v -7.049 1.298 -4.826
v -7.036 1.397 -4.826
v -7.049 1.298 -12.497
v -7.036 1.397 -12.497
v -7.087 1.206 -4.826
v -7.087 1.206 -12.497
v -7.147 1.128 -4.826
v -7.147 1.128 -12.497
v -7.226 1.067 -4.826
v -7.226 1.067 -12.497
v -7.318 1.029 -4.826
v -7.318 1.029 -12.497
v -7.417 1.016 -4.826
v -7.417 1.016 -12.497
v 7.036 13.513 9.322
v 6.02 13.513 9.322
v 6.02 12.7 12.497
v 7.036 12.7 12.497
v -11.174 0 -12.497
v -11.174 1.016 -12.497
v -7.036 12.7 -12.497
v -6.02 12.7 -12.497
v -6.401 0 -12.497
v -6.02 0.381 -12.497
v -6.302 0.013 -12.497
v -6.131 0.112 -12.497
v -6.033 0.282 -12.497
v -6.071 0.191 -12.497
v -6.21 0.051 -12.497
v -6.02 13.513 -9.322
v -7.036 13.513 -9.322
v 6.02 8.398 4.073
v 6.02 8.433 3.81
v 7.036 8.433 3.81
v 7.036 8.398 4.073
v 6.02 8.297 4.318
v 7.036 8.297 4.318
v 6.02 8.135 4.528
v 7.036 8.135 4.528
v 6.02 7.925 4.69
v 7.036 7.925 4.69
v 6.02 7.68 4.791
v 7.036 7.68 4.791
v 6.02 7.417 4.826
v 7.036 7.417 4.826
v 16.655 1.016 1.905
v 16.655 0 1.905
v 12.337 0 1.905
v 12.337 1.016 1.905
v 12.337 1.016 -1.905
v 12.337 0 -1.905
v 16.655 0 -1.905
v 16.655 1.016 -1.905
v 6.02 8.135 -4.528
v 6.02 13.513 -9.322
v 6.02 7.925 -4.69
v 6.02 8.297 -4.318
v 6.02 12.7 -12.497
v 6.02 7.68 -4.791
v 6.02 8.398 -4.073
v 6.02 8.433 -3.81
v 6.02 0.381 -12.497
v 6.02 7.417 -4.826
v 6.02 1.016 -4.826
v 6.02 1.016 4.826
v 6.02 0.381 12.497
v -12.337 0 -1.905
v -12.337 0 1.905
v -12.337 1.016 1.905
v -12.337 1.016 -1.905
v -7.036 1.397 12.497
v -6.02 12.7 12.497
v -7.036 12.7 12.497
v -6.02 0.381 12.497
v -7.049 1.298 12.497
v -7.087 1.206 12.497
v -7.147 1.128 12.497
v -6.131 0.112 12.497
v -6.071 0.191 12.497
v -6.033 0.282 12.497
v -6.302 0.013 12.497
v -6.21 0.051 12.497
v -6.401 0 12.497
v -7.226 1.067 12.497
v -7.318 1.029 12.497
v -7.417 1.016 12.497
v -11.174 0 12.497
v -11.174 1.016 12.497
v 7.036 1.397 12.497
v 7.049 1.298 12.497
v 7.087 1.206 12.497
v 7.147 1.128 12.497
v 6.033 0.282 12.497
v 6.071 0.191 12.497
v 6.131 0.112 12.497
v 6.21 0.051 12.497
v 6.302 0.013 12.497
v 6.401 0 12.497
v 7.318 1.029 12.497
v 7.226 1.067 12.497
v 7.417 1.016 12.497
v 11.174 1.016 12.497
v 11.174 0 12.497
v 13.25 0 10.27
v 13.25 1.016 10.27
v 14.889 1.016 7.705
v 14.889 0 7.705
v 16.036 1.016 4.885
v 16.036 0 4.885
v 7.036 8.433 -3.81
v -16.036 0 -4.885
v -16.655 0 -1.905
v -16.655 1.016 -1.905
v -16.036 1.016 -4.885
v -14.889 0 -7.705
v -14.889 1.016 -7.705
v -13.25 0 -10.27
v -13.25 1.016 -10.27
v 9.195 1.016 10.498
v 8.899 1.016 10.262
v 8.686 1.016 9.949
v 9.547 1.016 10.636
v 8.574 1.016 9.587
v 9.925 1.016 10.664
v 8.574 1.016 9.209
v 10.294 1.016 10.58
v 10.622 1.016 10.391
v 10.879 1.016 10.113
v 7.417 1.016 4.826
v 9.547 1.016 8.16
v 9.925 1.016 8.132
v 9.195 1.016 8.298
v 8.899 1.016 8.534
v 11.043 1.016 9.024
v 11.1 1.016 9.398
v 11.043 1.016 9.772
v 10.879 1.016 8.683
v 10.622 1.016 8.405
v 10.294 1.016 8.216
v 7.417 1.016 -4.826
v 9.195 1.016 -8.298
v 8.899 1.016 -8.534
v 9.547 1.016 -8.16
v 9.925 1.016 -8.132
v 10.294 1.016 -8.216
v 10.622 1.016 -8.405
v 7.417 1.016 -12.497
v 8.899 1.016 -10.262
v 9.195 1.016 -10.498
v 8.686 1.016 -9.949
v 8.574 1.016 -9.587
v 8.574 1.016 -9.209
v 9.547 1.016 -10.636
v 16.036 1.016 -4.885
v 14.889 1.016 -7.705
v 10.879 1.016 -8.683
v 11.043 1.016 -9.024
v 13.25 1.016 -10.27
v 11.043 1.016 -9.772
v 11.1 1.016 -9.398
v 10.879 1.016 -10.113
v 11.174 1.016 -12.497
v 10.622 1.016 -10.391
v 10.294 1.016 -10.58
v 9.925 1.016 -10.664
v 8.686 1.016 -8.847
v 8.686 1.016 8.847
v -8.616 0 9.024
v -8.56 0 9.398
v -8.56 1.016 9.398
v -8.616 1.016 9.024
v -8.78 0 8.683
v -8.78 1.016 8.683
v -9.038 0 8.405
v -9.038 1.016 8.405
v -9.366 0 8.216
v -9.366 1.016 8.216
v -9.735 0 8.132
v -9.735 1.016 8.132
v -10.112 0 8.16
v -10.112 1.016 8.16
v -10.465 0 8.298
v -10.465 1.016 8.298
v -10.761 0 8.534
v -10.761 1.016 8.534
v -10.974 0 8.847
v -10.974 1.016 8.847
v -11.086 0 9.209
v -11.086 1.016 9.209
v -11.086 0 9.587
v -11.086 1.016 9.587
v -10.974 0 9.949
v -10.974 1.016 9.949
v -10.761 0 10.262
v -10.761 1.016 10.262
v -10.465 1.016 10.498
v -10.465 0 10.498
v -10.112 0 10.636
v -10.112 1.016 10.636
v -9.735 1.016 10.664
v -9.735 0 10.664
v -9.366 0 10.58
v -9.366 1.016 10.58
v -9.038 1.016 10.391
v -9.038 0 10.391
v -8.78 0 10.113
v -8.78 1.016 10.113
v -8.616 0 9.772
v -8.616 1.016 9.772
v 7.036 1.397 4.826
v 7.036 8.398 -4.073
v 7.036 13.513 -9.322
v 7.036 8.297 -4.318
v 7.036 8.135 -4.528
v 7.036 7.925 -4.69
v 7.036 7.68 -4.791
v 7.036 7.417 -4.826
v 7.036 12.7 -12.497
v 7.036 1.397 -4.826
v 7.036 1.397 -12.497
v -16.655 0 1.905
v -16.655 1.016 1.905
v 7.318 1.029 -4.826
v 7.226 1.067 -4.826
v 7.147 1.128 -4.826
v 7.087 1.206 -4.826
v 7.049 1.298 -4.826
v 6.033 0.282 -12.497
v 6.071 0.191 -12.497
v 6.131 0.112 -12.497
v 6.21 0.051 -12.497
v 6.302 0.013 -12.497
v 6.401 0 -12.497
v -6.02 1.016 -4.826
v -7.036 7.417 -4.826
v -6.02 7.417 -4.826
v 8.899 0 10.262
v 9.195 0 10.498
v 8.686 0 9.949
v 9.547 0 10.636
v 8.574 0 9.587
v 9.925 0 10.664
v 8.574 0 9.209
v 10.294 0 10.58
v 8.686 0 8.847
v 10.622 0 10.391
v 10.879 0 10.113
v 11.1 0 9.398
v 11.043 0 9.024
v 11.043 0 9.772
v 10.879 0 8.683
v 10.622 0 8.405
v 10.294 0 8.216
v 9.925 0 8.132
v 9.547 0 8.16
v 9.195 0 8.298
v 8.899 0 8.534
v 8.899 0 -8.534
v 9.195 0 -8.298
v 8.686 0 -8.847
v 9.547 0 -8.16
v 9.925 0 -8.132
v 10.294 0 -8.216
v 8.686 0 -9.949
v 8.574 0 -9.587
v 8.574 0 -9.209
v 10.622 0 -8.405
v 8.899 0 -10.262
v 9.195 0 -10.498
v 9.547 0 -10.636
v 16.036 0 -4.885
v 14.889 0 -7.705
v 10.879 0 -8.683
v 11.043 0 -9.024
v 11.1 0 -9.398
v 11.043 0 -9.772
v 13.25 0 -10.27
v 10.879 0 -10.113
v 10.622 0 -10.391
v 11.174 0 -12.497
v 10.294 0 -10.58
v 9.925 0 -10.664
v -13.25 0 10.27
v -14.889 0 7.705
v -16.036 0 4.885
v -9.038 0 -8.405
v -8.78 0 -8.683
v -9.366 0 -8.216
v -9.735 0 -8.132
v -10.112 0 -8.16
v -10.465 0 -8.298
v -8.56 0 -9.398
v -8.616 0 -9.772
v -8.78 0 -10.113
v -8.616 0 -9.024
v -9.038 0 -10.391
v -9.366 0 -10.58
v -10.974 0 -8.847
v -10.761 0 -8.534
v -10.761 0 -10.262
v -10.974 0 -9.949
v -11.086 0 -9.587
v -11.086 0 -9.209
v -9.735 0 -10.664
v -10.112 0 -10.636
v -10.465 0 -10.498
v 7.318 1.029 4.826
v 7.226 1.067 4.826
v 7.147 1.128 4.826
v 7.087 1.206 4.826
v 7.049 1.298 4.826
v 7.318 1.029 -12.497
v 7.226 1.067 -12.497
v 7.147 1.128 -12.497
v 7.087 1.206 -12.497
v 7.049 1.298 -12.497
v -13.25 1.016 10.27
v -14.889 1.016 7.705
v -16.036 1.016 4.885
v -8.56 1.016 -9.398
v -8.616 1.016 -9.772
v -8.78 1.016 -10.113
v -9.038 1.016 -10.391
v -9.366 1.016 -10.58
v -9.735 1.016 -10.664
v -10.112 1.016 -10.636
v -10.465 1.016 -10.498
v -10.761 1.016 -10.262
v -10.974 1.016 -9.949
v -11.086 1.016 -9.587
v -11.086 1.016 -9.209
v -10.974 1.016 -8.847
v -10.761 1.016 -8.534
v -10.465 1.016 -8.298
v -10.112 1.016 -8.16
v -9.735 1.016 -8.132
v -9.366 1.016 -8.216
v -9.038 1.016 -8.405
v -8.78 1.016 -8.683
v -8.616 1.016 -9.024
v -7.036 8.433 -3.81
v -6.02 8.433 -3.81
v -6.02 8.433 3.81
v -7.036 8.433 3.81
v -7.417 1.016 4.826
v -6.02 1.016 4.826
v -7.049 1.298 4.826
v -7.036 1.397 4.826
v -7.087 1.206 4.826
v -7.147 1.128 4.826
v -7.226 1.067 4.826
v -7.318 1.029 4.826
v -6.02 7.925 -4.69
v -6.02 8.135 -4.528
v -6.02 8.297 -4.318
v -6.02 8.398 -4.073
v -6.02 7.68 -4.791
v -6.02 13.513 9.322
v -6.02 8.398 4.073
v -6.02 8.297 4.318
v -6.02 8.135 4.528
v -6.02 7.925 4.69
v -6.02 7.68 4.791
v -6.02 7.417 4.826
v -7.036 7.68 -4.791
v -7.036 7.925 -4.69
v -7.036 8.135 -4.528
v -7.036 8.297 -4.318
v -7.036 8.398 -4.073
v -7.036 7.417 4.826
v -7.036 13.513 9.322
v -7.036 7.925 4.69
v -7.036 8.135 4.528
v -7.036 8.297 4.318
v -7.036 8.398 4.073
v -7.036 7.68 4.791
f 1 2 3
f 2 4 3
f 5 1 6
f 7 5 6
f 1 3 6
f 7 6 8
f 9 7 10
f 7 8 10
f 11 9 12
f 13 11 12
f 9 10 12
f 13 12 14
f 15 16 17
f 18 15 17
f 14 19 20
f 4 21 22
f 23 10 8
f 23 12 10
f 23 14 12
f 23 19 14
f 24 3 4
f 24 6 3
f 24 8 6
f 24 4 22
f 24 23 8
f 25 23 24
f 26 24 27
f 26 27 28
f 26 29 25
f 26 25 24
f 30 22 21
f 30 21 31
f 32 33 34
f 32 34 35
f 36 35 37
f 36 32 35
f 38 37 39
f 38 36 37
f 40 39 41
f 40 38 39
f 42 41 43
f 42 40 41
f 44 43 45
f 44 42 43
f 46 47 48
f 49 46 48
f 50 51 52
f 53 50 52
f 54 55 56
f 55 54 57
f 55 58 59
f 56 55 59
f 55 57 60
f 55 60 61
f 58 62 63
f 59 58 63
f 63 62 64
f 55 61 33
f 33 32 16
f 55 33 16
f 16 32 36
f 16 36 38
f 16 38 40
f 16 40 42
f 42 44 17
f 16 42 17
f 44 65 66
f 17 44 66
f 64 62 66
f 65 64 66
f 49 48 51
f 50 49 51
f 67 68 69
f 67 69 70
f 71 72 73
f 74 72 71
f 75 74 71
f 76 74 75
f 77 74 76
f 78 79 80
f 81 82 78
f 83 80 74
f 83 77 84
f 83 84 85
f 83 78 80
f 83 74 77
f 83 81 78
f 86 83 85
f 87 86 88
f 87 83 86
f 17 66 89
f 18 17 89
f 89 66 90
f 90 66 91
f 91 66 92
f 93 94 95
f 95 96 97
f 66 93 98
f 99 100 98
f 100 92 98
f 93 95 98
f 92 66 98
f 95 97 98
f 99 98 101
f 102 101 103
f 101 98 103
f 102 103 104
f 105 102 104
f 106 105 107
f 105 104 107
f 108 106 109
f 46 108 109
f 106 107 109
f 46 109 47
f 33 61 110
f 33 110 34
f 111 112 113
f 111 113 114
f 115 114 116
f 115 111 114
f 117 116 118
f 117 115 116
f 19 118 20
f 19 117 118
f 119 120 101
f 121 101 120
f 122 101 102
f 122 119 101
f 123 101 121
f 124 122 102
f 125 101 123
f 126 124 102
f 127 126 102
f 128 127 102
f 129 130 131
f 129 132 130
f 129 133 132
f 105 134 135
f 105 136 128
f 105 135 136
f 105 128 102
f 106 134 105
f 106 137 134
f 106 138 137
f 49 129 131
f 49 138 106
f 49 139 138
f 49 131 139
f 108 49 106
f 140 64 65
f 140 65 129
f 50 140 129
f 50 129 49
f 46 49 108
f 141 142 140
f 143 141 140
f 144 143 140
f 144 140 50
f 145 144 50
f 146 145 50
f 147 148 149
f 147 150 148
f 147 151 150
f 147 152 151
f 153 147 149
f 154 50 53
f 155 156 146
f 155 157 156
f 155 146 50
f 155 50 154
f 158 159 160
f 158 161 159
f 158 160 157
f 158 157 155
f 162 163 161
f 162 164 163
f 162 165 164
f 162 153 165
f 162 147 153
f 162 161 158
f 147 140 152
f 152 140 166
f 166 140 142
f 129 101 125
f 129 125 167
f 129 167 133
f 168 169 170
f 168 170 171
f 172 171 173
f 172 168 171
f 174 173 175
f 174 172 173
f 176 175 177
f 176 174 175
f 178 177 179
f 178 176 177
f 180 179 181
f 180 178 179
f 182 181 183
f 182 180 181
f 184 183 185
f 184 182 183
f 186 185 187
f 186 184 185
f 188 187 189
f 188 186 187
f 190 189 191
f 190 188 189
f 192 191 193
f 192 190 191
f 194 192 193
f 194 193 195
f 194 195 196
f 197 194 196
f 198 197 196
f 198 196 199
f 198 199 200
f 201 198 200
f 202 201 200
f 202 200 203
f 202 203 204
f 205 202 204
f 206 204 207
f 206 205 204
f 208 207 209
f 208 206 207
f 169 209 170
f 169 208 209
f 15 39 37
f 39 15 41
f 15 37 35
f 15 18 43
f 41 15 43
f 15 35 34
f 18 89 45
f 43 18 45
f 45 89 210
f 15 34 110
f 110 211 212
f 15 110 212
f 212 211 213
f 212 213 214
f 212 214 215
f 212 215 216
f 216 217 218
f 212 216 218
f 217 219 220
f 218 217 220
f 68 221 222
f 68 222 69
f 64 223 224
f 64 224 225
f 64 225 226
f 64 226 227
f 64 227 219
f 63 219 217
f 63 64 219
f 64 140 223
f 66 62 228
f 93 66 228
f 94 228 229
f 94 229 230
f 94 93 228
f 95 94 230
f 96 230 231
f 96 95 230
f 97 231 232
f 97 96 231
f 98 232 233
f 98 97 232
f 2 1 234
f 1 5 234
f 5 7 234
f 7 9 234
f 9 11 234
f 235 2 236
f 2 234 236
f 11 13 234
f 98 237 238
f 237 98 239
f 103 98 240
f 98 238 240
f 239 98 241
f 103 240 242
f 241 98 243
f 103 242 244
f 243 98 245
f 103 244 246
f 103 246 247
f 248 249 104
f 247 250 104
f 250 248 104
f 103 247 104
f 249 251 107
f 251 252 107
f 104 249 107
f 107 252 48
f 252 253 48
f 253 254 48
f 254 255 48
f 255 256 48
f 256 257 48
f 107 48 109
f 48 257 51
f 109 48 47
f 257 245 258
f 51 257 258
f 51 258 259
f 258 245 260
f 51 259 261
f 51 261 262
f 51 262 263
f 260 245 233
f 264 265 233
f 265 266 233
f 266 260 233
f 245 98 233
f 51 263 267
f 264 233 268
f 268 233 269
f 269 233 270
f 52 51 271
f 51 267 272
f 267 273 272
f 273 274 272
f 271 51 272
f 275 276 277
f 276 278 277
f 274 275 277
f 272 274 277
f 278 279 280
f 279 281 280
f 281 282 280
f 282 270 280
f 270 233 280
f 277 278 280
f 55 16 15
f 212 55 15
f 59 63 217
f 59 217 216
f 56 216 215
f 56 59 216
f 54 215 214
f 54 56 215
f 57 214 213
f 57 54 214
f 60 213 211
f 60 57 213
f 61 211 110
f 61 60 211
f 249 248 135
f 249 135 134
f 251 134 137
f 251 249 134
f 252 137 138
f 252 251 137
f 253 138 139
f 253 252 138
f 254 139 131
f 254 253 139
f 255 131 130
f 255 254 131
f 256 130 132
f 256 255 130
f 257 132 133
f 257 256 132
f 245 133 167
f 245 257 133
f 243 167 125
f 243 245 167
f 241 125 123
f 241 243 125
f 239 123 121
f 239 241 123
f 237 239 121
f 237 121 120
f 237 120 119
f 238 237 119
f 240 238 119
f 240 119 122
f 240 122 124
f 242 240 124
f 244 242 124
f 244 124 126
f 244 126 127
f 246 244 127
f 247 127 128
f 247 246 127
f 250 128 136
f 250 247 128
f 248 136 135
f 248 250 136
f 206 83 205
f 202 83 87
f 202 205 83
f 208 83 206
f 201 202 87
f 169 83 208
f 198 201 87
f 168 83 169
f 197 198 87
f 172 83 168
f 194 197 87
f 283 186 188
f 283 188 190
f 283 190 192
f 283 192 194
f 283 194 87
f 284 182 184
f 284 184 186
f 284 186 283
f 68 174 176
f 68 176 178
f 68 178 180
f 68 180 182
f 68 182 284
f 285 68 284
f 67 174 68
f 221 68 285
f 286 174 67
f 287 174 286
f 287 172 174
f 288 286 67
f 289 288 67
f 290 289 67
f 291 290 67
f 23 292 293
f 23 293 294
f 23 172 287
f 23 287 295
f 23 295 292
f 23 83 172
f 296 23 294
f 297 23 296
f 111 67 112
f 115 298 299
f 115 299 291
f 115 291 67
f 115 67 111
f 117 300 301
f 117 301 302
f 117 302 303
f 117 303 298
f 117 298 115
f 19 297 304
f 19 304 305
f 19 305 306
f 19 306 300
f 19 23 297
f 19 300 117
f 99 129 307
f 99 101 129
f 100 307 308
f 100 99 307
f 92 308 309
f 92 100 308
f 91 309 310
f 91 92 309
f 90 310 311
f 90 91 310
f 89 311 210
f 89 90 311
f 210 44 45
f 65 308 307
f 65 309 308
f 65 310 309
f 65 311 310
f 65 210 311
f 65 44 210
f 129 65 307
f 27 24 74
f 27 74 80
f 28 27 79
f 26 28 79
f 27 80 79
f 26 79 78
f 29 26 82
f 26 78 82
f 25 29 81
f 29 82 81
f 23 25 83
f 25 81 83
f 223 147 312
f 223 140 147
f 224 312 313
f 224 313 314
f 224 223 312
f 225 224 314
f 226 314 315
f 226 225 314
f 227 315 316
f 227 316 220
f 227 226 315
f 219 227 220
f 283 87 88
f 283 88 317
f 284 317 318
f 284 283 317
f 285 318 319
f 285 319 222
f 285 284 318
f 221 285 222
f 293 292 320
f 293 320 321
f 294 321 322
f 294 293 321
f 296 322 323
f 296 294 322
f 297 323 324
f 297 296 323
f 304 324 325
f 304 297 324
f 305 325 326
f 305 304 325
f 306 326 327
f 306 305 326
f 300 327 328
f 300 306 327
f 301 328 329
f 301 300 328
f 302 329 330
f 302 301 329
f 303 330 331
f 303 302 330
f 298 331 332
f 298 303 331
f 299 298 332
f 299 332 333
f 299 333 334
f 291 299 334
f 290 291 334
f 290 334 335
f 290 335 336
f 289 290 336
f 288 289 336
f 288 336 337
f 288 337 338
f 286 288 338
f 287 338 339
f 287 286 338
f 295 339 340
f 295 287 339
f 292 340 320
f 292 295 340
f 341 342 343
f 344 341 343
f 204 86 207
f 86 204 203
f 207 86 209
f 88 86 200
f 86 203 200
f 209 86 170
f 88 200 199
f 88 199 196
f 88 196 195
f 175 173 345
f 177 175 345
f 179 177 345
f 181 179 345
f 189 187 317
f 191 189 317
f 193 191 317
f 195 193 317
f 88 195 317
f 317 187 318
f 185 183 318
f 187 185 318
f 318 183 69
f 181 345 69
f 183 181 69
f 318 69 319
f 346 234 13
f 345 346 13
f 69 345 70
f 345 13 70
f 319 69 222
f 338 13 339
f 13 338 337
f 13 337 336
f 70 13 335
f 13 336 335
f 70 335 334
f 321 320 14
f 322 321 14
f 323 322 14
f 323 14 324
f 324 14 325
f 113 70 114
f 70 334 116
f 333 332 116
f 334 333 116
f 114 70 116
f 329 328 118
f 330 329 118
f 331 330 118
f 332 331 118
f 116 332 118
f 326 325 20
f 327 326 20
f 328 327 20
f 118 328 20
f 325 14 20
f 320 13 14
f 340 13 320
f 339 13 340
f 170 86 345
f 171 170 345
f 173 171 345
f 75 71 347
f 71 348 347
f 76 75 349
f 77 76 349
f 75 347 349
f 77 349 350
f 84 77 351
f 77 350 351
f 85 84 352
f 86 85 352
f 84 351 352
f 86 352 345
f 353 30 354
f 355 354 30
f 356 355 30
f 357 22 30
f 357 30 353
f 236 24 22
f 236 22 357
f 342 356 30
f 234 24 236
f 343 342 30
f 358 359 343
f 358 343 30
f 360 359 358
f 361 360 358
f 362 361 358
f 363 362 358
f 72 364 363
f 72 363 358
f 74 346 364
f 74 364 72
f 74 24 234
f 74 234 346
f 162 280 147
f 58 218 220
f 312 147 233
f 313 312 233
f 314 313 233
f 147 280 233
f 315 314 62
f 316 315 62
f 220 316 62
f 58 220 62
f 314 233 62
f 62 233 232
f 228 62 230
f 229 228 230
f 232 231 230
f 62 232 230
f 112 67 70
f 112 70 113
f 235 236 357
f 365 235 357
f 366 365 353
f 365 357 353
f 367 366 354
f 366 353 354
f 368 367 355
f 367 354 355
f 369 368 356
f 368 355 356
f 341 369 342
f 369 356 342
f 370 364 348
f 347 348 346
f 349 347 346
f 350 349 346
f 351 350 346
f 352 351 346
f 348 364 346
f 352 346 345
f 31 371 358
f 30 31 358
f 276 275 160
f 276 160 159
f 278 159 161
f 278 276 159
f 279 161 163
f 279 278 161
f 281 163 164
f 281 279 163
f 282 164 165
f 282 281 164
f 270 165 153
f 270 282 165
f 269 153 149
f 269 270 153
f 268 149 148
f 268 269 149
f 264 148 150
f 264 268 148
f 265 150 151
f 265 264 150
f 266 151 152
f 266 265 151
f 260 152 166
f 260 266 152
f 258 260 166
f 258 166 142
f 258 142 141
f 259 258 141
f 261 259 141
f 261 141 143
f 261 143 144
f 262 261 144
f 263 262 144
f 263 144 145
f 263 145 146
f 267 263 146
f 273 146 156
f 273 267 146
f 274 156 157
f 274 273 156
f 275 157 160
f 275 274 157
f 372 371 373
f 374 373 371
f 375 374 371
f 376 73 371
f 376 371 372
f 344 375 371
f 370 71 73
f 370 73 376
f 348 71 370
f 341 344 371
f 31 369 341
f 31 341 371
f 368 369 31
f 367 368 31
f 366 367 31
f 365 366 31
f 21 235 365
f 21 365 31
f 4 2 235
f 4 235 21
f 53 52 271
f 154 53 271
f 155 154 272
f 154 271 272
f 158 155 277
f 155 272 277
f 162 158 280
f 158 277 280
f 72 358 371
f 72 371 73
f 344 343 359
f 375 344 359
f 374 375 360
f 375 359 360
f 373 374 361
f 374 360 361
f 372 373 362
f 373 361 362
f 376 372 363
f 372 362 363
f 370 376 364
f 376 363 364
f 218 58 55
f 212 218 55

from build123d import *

# Parameters (mm, degrees)
SKETCH1_R               = 1.27
BOSS_EXTRUDE1_DEPTH     = 1.016
BOSS_EXTRUDE1_2_DEPTH   = 1.016
SKETCH2_W               = 1.016
SKETCH2_H               = 24.9936
BOSS_EXTRUDE2_DEPTH     = 13.5128
CUT_EXTRUDE1_DEPTH      = 13.5128
CUT_EXTRUDE1_DEPTH_BACK = 13.5128
FILLET1_R               = 0.381
FILLET2_R               = 0.381


with BuildPart() as part:
    # Sketch1 → Boss-Extrude1 (new body)
    with BuildSketch(Plane(origin=(0, 0, 0), x_dir=(1, 0, 0), z_dir=(0, 1, 0))):
        with BuildLine():
            Line((11.174152575, 12.4968), (6.0198, 12.4968))
            Line((6.0198, 12.4968), (6.0198, -12.4968))
            Line((6.0198, -12.4968), (11.174152575, -12.4968))
            ThreePointArc((11.174152575, -12.4968), (14.888508669, -7.704804061), (16.655409662, -1.905))
            Line((16.655409662, -1.905), (12.337409662, -1.905))
            Line((12.337409662, -1.905), (12.337409662, 1.905))
            Line((12.337409662, 1.905), (16.655409662, 1.905))
            ThreePointArc((16.655409662, 1.905), (14.888508669, 7.704804061), (11.174152575, 12.4968))
        make_face()
        with Locations((9.8298, -9.398)):
            Circle(SKETCH1_R, mode=Mode.SUBTRACT)
        with Locations((9.8298, 9.398)):
            Circle(SKETCH1_R, mode=Mode.SUBTRACT)
    extrude(amount=BOSS_EXTRUDE1_DEPTH)



with BuildPart() as body_2:
    # Sketch1 → Boss-Extrude1 2 (new body)
    with BuildSketch(Plane(origin=(0, 0, 0), x_dir=(1, 0, 0), z_dir=(0, 1, 0))):
        with BuildLine():
            Line((-6.0198, -12.4968), (-11.174152575, -12.4968))
            ThreePointArc((-11.174152575, -12.4968), (-14.888508669, -7.704804061), (-16.655409662, -1.905))
            Line((-16.655409662, -1.905), (-12.337409662, -1.905))
            Line((-12.337409662, -1.905), (-12.337409662, 1.905))
            Line((-12.337409662, 1.905), (-16.655409662, 1.905))
            ThreePointArc((-16.655409662, 1.905), (-14.888508669, 7.704804061), (-11.174152575, 12.4968))
            Line((-11.174152575, 12.4968), (-6.0198, 12.4968))
            Line((-6.0198, 12.4968), (-6.0198, -12.4968))
        make_face()
        with Locations((-9.8298, 9.398)):
            Circle(SKETCH1_R, mode=Mode.SUBTRACT)
        with Locations((-9.8298, -9.398)):
            Circle(SKETCH1_R, mode=Mode.SUBTRACT)
    extrude(amount=BOSS_EXTRUDE1_2_DEPTH)


with BuildPart() as part_1:
    add(part.part)

    add(body_2.part)  # Boss-Extrude2 merges body 2
    # Sketch2 → Boss-Extrude2 (add)
    with BuildSketch(Plane(origin=(0, 0, 0), x_dir=(1, 0, 0), z_dir=(0, 1, 0))):
        with Locations((-6.5278, 0)):
            Rectangle(SKETCH2_W, SKETCH2_H)
        with Locations((6.5278, 0)):
            Rectangle(SKETCH2_W, SKETCH2_H)
    extrude(amount=BOSS_EXTRUDE2_DEPTH)

    # Sketch3 → Cut-Extrude1 (cut, two sides)
    with BuildSketch(Plane(origin=(0, 0, 0), x_dir=(0, 0, -1), z_dir=(1, 0, 0))) as cut_extrude1_sk:
        Polygon((-12.4968, 13.5128), (-9.3218, 13.5128), (-12.4968, 12.7), align=None)
        Polygon((12.4968, 13.5128), (12.4968, 12.7), (9.3218, 13.5128), align=None)
        with BuildLine():
            Line((-4.826, 7.4168), (-4.826, 1.016))
            Line((-4.826, 1.016), (4.826, 1.016))
            Line((4.826, 1.016), (4.826, 7.4168))
            ThreePointArc((4.826, 7.4168), (4.52842049, 8.13522049), (3.81, 8.4328))
            Line((3.81, 8.4328), (-3.81, 8.4328))
            ThreePointArc((-3.81, 8.4328), (-4.52842049, 8.13522049), (-4.826, 7.4168))
        make_face()
    extrude(amount=CUT_EXTRUDE1_DEPTH, mode=Mode.SUBTRACT)
    extrude(cut_extrude1_sk.sketch, amount=-CUT_EXTRUDE1_DEPTH_BACK, mode=Mode.SUBTRACT)

    # Fillet1
    fillet1_edges = [part_1.edges().sort_by_distance(p)[0] for p in [
        (-7.0358, 1.016, 8.6614),
        (-7.0358, 1.016, -8.6614),
        (-6.0198, 0, 0),
    ]]
    fillet(fillet1_edges, radius=FILLET1_R)

    # Fillet2
    fillet2_edges = [part_1.edges().sort_by_distance(p)[0] for p in [
        (7.0358, 1.016, -8.6614),
        (7.0358, 1.016, 8.6614),
        (6.0198, 0, 0),
    ]]
    fillet(fillet2_edges, radius=FILLET2_R)


solid = part_1.part
